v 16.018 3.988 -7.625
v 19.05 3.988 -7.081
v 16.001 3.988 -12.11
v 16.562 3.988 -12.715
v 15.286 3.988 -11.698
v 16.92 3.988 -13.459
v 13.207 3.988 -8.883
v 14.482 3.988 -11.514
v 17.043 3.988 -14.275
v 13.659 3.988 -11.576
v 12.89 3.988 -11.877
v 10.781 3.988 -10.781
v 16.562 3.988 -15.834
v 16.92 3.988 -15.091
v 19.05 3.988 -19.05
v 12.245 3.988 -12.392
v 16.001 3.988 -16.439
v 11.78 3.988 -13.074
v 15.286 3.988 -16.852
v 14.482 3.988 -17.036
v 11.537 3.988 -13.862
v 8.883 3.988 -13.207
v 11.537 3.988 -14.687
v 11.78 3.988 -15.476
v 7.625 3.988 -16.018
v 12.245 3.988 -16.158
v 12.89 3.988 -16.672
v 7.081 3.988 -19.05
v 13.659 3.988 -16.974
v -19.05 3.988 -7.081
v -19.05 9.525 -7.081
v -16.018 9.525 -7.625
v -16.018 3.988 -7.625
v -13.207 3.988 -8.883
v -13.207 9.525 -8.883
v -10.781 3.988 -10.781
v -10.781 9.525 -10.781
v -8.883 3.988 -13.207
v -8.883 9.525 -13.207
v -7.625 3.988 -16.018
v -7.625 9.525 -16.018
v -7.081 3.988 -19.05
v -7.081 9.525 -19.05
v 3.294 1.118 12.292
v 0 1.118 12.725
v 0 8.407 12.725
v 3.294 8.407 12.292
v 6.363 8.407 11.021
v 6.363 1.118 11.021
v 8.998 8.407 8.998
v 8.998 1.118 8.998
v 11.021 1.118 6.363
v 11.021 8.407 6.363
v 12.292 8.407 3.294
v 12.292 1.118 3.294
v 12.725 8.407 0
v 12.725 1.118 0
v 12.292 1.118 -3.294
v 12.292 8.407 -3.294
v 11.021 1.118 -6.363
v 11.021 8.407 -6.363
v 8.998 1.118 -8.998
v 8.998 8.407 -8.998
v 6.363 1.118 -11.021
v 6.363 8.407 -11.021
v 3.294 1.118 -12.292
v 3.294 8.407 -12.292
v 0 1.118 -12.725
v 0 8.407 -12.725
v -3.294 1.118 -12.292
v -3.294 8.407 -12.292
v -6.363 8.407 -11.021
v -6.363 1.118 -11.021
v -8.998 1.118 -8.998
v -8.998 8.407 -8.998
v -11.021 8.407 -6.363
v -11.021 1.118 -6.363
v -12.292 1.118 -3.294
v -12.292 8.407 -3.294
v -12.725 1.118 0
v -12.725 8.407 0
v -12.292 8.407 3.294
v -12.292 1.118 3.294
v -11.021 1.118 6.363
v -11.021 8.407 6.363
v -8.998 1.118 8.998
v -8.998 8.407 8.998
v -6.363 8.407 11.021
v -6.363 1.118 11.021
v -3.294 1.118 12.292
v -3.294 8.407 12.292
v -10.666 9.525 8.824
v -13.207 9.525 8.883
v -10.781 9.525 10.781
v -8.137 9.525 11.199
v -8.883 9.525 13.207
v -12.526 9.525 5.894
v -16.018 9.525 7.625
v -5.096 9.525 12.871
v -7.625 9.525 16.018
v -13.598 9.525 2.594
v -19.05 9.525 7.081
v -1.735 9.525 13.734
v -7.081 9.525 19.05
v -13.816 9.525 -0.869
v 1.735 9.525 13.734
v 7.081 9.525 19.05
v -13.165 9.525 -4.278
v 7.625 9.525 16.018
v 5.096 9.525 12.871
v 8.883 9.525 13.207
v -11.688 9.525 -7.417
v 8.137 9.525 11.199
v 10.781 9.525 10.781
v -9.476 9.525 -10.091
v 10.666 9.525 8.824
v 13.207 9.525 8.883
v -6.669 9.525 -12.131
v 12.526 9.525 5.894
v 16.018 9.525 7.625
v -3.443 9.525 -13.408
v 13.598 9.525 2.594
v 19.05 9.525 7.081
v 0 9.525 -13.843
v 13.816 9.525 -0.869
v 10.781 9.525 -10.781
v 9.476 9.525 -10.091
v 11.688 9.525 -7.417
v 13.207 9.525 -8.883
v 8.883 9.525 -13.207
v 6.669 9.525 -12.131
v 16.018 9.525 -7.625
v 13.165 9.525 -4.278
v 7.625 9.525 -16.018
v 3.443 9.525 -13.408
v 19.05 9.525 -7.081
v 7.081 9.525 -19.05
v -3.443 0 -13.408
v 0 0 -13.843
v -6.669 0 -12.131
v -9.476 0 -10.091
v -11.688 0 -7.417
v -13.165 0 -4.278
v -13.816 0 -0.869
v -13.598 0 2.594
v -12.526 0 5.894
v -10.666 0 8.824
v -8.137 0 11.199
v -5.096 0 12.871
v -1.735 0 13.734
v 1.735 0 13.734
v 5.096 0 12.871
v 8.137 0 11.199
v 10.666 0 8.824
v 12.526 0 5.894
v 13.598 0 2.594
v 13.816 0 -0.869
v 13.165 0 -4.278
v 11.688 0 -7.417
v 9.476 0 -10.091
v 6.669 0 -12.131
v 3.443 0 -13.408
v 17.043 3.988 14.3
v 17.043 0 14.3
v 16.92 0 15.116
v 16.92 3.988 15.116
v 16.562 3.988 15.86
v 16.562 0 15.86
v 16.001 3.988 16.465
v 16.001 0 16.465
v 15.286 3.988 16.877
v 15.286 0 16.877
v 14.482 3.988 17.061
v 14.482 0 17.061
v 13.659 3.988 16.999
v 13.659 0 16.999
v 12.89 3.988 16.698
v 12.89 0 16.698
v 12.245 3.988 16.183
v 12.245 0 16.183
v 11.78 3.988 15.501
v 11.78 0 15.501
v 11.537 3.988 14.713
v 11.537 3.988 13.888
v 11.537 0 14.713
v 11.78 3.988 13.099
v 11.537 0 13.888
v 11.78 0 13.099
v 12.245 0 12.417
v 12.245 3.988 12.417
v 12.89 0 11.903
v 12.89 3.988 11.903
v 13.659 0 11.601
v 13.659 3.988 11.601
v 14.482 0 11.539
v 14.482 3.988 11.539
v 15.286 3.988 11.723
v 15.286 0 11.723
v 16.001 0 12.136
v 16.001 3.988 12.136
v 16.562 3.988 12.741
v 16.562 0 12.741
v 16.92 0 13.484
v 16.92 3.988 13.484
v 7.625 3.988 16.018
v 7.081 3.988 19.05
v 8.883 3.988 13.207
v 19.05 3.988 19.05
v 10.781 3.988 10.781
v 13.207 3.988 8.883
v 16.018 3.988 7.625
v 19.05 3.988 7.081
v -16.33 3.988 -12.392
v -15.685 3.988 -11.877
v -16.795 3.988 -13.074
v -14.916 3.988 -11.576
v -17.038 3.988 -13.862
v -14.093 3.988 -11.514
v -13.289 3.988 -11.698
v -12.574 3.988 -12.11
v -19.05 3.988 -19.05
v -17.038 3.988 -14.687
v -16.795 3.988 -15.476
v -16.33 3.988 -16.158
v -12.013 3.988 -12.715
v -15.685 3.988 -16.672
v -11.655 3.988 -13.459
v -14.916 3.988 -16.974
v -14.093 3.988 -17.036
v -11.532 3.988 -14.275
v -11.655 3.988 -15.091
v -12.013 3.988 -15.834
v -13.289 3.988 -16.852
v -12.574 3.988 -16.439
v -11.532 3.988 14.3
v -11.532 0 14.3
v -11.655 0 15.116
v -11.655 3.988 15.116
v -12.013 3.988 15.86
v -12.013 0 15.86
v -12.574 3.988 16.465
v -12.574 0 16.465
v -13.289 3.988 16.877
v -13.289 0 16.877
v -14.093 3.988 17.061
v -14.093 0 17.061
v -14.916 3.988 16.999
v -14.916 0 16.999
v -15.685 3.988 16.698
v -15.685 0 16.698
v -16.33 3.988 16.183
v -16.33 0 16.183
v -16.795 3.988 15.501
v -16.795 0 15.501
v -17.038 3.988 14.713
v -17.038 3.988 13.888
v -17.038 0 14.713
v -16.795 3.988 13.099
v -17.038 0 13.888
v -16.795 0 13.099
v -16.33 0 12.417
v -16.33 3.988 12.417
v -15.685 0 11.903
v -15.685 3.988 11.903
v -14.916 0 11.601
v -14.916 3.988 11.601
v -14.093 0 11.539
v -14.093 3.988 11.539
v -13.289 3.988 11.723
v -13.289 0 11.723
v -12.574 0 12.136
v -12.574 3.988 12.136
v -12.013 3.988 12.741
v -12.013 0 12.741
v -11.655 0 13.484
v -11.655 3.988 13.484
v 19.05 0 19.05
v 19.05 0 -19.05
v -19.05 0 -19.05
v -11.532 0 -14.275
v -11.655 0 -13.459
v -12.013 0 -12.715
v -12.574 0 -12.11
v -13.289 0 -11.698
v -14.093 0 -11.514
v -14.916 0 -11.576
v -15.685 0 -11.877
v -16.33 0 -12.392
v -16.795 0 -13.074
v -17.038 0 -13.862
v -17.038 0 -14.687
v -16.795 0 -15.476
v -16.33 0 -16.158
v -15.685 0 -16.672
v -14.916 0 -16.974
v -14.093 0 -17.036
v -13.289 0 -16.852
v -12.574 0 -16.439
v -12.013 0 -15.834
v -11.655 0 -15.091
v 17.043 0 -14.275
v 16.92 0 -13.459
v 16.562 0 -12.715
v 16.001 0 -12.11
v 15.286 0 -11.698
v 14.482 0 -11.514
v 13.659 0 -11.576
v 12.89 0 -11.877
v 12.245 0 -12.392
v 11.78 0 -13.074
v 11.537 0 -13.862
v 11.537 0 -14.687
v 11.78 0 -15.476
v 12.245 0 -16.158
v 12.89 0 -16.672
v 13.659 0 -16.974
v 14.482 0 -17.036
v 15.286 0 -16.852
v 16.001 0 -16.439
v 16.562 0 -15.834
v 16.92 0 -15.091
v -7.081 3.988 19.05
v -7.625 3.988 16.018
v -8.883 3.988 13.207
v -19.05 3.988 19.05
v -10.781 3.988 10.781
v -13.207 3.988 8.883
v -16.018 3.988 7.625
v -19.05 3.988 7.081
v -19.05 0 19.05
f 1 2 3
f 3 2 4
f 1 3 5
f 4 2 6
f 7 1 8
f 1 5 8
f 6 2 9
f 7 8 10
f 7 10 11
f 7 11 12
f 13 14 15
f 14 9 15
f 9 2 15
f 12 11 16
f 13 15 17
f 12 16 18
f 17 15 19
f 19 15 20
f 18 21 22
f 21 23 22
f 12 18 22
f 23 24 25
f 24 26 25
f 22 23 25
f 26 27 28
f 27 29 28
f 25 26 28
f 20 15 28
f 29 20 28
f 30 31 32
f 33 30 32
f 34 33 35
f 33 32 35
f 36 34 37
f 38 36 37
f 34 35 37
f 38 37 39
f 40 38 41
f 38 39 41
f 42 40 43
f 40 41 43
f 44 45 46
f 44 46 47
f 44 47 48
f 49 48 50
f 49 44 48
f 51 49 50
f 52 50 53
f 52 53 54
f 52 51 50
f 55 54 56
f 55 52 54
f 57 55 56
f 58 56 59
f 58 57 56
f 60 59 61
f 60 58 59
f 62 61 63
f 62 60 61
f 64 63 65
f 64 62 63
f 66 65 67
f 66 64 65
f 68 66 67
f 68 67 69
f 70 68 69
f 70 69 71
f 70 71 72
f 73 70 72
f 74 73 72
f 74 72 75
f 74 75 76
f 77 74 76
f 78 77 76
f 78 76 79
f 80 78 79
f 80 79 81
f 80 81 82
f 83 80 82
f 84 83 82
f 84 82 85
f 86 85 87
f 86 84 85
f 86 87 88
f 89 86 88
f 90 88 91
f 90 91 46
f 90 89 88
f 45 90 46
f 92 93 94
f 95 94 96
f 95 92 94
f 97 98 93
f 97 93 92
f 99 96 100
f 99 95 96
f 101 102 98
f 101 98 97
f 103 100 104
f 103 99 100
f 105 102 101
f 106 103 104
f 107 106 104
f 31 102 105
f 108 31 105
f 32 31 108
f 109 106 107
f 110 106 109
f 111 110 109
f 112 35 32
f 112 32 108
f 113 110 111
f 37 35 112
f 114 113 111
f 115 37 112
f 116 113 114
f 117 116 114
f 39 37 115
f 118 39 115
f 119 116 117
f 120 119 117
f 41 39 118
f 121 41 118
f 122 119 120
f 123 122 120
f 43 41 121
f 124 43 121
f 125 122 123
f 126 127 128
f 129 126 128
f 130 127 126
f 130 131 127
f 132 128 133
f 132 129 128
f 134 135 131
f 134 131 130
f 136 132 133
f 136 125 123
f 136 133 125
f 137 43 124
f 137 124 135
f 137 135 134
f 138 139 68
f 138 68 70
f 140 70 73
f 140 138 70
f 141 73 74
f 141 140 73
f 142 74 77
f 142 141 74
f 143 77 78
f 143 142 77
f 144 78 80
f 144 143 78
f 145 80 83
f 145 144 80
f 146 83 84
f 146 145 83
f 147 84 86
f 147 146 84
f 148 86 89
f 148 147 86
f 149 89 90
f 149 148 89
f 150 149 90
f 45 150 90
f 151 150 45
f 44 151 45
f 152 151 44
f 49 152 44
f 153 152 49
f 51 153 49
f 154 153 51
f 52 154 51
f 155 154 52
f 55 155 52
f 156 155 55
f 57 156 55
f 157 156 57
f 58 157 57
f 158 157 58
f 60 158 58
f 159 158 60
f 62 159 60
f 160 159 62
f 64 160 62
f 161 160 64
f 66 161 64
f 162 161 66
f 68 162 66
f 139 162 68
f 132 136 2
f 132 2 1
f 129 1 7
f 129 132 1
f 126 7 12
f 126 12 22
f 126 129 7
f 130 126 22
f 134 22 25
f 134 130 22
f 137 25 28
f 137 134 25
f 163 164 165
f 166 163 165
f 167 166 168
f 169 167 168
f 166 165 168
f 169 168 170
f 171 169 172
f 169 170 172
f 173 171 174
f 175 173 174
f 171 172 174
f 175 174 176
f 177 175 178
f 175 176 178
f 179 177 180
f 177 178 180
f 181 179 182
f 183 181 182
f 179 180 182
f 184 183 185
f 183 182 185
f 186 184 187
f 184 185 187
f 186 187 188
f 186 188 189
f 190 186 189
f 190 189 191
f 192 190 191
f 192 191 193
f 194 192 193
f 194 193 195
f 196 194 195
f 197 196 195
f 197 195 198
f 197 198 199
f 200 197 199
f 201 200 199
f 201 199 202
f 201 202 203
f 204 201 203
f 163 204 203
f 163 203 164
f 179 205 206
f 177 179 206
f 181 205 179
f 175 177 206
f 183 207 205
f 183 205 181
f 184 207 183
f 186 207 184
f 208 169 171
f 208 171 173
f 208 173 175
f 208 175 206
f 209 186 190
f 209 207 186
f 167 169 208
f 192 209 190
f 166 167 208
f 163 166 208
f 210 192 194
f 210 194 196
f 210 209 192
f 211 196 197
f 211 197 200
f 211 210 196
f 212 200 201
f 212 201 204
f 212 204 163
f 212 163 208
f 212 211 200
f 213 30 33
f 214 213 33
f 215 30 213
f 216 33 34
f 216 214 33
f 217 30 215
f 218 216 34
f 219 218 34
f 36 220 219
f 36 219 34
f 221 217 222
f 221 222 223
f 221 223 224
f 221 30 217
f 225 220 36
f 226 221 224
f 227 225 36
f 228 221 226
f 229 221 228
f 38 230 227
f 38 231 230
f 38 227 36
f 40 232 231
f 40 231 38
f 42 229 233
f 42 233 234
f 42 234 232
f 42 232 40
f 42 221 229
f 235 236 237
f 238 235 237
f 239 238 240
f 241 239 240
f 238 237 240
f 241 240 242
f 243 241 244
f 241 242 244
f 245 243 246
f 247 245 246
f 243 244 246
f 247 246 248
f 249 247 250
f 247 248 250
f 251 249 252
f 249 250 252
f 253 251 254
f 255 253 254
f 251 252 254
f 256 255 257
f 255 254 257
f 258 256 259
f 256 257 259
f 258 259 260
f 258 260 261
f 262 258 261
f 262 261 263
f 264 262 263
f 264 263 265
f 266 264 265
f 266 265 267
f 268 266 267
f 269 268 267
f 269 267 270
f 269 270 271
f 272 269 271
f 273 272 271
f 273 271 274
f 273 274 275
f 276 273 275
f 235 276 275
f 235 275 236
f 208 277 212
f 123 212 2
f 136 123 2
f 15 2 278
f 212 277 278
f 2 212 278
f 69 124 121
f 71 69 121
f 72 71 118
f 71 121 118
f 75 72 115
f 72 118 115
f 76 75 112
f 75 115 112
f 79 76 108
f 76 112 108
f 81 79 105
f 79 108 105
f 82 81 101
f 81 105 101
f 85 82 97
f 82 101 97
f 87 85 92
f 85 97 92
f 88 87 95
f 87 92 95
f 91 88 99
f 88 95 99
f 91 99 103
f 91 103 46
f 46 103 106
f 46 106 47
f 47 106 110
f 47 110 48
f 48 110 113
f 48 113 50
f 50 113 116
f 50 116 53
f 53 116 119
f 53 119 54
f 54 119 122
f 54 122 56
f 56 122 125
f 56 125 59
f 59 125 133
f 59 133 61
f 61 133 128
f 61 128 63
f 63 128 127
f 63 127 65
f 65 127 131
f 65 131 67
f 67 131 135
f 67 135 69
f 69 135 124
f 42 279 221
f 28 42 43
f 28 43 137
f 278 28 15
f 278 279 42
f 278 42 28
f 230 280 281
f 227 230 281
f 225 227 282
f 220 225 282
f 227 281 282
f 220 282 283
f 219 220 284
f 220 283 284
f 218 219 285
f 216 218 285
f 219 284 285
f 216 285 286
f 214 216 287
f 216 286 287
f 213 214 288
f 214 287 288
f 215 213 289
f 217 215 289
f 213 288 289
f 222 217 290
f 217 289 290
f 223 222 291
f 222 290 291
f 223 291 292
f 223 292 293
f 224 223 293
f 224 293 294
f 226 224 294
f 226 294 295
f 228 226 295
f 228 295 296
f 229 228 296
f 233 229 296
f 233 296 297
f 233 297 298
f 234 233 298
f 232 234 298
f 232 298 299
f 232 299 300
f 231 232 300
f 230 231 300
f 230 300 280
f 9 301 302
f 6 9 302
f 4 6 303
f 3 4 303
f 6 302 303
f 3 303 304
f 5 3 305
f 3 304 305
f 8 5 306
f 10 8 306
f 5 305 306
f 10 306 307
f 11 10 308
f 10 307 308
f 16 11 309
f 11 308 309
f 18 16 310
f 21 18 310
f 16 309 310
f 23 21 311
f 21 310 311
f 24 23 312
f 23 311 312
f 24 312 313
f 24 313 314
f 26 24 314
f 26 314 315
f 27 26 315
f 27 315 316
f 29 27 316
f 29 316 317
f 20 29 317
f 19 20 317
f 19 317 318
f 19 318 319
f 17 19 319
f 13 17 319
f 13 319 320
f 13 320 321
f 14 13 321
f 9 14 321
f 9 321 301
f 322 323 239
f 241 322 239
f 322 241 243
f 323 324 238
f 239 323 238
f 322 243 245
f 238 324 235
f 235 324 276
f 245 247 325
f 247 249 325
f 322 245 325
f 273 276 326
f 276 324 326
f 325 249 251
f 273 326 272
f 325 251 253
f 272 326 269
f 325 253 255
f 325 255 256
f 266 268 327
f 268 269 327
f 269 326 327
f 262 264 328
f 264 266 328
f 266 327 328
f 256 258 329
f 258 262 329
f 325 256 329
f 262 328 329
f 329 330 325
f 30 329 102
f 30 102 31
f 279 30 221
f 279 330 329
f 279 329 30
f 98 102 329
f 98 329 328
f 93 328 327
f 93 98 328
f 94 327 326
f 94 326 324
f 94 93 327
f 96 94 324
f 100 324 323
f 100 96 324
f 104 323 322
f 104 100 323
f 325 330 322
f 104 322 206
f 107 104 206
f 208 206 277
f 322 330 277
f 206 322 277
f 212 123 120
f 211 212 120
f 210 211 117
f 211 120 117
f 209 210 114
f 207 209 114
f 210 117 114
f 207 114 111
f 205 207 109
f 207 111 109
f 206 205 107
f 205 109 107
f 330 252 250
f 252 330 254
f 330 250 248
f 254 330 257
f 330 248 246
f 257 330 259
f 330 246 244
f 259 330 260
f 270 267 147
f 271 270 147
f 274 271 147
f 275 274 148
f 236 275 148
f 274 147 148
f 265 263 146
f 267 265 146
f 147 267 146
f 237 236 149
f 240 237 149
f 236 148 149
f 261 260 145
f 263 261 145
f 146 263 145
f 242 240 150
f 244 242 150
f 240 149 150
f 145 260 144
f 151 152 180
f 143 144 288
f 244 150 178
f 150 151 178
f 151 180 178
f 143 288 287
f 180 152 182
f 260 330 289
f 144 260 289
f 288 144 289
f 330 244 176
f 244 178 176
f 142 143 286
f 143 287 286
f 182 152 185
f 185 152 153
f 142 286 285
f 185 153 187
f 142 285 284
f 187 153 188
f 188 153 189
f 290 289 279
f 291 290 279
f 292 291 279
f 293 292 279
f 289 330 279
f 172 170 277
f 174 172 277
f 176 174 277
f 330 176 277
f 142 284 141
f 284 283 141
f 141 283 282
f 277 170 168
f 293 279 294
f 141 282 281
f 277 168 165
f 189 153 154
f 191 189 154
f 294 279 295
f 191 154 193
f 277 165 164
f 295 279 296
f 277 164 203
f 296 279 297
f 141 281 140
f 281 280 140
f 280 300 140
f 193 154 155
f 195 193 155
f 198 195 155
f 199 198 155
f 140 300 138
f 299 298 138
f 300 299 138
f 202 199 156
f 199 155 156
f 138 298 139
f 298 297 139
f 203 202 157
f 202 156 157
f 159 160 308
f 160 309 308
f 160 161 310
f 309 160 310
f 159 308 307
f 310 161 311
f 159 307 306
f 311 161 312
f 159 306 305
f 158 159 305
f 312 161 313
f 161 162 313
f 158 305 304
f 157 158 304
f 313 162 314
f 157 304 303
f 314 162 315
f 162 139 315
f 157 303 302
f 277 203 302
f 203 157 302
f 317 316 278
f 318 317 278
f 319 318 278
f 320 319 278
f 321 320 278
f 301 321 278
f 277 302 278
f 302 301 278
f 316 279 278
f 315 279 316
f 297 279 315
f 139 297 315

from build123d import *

# Parameters (mm, degrees)
SKETCH1_W          = 38.1
SKETCH1_H          = 38.1
SKETCH1_R          = 12.7254
EXTRUDE1_DEPTH     = 9.525
CUT_EXTRUDE1_DEPTH = 5.5372
HOLE1_D            = 5.5372
HOLE1_DEPTH        = 3.9878


with BuildPart() as part:
    # Sketch1 → Extrude1 (new body)
    with BuildSketch(Plane(origin=(0, 0, 0), x_dir=(1, 0, 0), z_dir=(0, 1, 0))):
        Rectangle(SKETCH1_W, SKETCH1_H)
        with Locations(Location((0, 0, 0), (0, 0, 270))):  # turned: the seam where the file's is
            Circle(SKETCH1_R, mode=Mode.SUBTRACT)
    extrude(amount=EXTRUDE1_DEPTH)

    # Sketch2 → Cut-Extrude1 (cut)
    with BuildSketch(Plane(origin=(0, 9.525, 0), x_dir=(1, 0, 0), z_dir=(0, 1, 0))):
        with BuildLine():
            Line((7.081129237, -19.05), (19.05, -19.05))
            Line((19.05, -19.05), (19.05, -7.081129237))
            ThreePointArc((19.05, -7.081129237), (10.780943879, -10.780943879), (7.081129237, -19.05))
        make_face()
        with BuildLine():
            Line((19.05, 19.05), (19.05, 7.081129237))
            ThreePointArc((19.05, 7.081129237), (10.780943879, 10.780943879), (7.081129237, 19.05))
            Line((7.081129237, 19.05), (19.05, 19.05))
        make_face()
        with BuildLine():
            Line((-7.081129237, 19.05), (-19.05, 19.05))
            Line((-19.05, 19.05), (-19.05, 7.081129237))
            ThreePointArc((-19.05, 7.081129237), (-10.780943879, 10.780943879), (-7.081129237, 19.05))
        make_face()
        with BuildLine():
            Line((-19.05, -19.05), (-19.05, -7.081129237))
            ThreePointArc((-19.05, -7.081129237), (-10.780943879, -10.780943879), (-7.081129237, -19.05))
            Line((-7.081129237, -19.05), (-19.05, -19.05))
        make_face()
    extrude(amount=-CUT_EXTRUDE1_DEPTH, mode=Mode.SUBTRACT)

    # Hole1
    with Locations(Plane(origin=(0, 3.9878, 0), x_dir=(-1, 0, 0), z_dir=(0, 1, 0))):
        with Locations((14.3002, 14.3002), (14.3002, -14.2748), (-14.2748, 14.3002), (-14.2748, -14.2748)):
            Hole(HOLE1_D / 2, depth=HOLE1_DEPTH)

    # Sketch5 → Cut-Revolve1 (revolve, cut)
    with BuildSketch(Plane(origin=(0, 0, 0), x_dir=(0, 0, -1), z_dir=(1, 0, 0)), mode=Mode.PRIVATE) as cut_revolve1_sk:
        Polygon((-13.843, 9.525), (-12.7254, 9.525), (-12.7254, 8.4074), align=None)
        Polygon((-12.7254, 1.1176), (-13.843, 0), (-12.7254, 0), align=None)
    revolve(cut_revolve1_sk.sketch.rotate(Axis((0, 0, 0), (0, 1, 0)), 180), axis=Axis((0, 0, 0), (0, 1, 0)), mode=Mode.SUBTRACT)  # turned: the seam where the file's is


solid = part.part
